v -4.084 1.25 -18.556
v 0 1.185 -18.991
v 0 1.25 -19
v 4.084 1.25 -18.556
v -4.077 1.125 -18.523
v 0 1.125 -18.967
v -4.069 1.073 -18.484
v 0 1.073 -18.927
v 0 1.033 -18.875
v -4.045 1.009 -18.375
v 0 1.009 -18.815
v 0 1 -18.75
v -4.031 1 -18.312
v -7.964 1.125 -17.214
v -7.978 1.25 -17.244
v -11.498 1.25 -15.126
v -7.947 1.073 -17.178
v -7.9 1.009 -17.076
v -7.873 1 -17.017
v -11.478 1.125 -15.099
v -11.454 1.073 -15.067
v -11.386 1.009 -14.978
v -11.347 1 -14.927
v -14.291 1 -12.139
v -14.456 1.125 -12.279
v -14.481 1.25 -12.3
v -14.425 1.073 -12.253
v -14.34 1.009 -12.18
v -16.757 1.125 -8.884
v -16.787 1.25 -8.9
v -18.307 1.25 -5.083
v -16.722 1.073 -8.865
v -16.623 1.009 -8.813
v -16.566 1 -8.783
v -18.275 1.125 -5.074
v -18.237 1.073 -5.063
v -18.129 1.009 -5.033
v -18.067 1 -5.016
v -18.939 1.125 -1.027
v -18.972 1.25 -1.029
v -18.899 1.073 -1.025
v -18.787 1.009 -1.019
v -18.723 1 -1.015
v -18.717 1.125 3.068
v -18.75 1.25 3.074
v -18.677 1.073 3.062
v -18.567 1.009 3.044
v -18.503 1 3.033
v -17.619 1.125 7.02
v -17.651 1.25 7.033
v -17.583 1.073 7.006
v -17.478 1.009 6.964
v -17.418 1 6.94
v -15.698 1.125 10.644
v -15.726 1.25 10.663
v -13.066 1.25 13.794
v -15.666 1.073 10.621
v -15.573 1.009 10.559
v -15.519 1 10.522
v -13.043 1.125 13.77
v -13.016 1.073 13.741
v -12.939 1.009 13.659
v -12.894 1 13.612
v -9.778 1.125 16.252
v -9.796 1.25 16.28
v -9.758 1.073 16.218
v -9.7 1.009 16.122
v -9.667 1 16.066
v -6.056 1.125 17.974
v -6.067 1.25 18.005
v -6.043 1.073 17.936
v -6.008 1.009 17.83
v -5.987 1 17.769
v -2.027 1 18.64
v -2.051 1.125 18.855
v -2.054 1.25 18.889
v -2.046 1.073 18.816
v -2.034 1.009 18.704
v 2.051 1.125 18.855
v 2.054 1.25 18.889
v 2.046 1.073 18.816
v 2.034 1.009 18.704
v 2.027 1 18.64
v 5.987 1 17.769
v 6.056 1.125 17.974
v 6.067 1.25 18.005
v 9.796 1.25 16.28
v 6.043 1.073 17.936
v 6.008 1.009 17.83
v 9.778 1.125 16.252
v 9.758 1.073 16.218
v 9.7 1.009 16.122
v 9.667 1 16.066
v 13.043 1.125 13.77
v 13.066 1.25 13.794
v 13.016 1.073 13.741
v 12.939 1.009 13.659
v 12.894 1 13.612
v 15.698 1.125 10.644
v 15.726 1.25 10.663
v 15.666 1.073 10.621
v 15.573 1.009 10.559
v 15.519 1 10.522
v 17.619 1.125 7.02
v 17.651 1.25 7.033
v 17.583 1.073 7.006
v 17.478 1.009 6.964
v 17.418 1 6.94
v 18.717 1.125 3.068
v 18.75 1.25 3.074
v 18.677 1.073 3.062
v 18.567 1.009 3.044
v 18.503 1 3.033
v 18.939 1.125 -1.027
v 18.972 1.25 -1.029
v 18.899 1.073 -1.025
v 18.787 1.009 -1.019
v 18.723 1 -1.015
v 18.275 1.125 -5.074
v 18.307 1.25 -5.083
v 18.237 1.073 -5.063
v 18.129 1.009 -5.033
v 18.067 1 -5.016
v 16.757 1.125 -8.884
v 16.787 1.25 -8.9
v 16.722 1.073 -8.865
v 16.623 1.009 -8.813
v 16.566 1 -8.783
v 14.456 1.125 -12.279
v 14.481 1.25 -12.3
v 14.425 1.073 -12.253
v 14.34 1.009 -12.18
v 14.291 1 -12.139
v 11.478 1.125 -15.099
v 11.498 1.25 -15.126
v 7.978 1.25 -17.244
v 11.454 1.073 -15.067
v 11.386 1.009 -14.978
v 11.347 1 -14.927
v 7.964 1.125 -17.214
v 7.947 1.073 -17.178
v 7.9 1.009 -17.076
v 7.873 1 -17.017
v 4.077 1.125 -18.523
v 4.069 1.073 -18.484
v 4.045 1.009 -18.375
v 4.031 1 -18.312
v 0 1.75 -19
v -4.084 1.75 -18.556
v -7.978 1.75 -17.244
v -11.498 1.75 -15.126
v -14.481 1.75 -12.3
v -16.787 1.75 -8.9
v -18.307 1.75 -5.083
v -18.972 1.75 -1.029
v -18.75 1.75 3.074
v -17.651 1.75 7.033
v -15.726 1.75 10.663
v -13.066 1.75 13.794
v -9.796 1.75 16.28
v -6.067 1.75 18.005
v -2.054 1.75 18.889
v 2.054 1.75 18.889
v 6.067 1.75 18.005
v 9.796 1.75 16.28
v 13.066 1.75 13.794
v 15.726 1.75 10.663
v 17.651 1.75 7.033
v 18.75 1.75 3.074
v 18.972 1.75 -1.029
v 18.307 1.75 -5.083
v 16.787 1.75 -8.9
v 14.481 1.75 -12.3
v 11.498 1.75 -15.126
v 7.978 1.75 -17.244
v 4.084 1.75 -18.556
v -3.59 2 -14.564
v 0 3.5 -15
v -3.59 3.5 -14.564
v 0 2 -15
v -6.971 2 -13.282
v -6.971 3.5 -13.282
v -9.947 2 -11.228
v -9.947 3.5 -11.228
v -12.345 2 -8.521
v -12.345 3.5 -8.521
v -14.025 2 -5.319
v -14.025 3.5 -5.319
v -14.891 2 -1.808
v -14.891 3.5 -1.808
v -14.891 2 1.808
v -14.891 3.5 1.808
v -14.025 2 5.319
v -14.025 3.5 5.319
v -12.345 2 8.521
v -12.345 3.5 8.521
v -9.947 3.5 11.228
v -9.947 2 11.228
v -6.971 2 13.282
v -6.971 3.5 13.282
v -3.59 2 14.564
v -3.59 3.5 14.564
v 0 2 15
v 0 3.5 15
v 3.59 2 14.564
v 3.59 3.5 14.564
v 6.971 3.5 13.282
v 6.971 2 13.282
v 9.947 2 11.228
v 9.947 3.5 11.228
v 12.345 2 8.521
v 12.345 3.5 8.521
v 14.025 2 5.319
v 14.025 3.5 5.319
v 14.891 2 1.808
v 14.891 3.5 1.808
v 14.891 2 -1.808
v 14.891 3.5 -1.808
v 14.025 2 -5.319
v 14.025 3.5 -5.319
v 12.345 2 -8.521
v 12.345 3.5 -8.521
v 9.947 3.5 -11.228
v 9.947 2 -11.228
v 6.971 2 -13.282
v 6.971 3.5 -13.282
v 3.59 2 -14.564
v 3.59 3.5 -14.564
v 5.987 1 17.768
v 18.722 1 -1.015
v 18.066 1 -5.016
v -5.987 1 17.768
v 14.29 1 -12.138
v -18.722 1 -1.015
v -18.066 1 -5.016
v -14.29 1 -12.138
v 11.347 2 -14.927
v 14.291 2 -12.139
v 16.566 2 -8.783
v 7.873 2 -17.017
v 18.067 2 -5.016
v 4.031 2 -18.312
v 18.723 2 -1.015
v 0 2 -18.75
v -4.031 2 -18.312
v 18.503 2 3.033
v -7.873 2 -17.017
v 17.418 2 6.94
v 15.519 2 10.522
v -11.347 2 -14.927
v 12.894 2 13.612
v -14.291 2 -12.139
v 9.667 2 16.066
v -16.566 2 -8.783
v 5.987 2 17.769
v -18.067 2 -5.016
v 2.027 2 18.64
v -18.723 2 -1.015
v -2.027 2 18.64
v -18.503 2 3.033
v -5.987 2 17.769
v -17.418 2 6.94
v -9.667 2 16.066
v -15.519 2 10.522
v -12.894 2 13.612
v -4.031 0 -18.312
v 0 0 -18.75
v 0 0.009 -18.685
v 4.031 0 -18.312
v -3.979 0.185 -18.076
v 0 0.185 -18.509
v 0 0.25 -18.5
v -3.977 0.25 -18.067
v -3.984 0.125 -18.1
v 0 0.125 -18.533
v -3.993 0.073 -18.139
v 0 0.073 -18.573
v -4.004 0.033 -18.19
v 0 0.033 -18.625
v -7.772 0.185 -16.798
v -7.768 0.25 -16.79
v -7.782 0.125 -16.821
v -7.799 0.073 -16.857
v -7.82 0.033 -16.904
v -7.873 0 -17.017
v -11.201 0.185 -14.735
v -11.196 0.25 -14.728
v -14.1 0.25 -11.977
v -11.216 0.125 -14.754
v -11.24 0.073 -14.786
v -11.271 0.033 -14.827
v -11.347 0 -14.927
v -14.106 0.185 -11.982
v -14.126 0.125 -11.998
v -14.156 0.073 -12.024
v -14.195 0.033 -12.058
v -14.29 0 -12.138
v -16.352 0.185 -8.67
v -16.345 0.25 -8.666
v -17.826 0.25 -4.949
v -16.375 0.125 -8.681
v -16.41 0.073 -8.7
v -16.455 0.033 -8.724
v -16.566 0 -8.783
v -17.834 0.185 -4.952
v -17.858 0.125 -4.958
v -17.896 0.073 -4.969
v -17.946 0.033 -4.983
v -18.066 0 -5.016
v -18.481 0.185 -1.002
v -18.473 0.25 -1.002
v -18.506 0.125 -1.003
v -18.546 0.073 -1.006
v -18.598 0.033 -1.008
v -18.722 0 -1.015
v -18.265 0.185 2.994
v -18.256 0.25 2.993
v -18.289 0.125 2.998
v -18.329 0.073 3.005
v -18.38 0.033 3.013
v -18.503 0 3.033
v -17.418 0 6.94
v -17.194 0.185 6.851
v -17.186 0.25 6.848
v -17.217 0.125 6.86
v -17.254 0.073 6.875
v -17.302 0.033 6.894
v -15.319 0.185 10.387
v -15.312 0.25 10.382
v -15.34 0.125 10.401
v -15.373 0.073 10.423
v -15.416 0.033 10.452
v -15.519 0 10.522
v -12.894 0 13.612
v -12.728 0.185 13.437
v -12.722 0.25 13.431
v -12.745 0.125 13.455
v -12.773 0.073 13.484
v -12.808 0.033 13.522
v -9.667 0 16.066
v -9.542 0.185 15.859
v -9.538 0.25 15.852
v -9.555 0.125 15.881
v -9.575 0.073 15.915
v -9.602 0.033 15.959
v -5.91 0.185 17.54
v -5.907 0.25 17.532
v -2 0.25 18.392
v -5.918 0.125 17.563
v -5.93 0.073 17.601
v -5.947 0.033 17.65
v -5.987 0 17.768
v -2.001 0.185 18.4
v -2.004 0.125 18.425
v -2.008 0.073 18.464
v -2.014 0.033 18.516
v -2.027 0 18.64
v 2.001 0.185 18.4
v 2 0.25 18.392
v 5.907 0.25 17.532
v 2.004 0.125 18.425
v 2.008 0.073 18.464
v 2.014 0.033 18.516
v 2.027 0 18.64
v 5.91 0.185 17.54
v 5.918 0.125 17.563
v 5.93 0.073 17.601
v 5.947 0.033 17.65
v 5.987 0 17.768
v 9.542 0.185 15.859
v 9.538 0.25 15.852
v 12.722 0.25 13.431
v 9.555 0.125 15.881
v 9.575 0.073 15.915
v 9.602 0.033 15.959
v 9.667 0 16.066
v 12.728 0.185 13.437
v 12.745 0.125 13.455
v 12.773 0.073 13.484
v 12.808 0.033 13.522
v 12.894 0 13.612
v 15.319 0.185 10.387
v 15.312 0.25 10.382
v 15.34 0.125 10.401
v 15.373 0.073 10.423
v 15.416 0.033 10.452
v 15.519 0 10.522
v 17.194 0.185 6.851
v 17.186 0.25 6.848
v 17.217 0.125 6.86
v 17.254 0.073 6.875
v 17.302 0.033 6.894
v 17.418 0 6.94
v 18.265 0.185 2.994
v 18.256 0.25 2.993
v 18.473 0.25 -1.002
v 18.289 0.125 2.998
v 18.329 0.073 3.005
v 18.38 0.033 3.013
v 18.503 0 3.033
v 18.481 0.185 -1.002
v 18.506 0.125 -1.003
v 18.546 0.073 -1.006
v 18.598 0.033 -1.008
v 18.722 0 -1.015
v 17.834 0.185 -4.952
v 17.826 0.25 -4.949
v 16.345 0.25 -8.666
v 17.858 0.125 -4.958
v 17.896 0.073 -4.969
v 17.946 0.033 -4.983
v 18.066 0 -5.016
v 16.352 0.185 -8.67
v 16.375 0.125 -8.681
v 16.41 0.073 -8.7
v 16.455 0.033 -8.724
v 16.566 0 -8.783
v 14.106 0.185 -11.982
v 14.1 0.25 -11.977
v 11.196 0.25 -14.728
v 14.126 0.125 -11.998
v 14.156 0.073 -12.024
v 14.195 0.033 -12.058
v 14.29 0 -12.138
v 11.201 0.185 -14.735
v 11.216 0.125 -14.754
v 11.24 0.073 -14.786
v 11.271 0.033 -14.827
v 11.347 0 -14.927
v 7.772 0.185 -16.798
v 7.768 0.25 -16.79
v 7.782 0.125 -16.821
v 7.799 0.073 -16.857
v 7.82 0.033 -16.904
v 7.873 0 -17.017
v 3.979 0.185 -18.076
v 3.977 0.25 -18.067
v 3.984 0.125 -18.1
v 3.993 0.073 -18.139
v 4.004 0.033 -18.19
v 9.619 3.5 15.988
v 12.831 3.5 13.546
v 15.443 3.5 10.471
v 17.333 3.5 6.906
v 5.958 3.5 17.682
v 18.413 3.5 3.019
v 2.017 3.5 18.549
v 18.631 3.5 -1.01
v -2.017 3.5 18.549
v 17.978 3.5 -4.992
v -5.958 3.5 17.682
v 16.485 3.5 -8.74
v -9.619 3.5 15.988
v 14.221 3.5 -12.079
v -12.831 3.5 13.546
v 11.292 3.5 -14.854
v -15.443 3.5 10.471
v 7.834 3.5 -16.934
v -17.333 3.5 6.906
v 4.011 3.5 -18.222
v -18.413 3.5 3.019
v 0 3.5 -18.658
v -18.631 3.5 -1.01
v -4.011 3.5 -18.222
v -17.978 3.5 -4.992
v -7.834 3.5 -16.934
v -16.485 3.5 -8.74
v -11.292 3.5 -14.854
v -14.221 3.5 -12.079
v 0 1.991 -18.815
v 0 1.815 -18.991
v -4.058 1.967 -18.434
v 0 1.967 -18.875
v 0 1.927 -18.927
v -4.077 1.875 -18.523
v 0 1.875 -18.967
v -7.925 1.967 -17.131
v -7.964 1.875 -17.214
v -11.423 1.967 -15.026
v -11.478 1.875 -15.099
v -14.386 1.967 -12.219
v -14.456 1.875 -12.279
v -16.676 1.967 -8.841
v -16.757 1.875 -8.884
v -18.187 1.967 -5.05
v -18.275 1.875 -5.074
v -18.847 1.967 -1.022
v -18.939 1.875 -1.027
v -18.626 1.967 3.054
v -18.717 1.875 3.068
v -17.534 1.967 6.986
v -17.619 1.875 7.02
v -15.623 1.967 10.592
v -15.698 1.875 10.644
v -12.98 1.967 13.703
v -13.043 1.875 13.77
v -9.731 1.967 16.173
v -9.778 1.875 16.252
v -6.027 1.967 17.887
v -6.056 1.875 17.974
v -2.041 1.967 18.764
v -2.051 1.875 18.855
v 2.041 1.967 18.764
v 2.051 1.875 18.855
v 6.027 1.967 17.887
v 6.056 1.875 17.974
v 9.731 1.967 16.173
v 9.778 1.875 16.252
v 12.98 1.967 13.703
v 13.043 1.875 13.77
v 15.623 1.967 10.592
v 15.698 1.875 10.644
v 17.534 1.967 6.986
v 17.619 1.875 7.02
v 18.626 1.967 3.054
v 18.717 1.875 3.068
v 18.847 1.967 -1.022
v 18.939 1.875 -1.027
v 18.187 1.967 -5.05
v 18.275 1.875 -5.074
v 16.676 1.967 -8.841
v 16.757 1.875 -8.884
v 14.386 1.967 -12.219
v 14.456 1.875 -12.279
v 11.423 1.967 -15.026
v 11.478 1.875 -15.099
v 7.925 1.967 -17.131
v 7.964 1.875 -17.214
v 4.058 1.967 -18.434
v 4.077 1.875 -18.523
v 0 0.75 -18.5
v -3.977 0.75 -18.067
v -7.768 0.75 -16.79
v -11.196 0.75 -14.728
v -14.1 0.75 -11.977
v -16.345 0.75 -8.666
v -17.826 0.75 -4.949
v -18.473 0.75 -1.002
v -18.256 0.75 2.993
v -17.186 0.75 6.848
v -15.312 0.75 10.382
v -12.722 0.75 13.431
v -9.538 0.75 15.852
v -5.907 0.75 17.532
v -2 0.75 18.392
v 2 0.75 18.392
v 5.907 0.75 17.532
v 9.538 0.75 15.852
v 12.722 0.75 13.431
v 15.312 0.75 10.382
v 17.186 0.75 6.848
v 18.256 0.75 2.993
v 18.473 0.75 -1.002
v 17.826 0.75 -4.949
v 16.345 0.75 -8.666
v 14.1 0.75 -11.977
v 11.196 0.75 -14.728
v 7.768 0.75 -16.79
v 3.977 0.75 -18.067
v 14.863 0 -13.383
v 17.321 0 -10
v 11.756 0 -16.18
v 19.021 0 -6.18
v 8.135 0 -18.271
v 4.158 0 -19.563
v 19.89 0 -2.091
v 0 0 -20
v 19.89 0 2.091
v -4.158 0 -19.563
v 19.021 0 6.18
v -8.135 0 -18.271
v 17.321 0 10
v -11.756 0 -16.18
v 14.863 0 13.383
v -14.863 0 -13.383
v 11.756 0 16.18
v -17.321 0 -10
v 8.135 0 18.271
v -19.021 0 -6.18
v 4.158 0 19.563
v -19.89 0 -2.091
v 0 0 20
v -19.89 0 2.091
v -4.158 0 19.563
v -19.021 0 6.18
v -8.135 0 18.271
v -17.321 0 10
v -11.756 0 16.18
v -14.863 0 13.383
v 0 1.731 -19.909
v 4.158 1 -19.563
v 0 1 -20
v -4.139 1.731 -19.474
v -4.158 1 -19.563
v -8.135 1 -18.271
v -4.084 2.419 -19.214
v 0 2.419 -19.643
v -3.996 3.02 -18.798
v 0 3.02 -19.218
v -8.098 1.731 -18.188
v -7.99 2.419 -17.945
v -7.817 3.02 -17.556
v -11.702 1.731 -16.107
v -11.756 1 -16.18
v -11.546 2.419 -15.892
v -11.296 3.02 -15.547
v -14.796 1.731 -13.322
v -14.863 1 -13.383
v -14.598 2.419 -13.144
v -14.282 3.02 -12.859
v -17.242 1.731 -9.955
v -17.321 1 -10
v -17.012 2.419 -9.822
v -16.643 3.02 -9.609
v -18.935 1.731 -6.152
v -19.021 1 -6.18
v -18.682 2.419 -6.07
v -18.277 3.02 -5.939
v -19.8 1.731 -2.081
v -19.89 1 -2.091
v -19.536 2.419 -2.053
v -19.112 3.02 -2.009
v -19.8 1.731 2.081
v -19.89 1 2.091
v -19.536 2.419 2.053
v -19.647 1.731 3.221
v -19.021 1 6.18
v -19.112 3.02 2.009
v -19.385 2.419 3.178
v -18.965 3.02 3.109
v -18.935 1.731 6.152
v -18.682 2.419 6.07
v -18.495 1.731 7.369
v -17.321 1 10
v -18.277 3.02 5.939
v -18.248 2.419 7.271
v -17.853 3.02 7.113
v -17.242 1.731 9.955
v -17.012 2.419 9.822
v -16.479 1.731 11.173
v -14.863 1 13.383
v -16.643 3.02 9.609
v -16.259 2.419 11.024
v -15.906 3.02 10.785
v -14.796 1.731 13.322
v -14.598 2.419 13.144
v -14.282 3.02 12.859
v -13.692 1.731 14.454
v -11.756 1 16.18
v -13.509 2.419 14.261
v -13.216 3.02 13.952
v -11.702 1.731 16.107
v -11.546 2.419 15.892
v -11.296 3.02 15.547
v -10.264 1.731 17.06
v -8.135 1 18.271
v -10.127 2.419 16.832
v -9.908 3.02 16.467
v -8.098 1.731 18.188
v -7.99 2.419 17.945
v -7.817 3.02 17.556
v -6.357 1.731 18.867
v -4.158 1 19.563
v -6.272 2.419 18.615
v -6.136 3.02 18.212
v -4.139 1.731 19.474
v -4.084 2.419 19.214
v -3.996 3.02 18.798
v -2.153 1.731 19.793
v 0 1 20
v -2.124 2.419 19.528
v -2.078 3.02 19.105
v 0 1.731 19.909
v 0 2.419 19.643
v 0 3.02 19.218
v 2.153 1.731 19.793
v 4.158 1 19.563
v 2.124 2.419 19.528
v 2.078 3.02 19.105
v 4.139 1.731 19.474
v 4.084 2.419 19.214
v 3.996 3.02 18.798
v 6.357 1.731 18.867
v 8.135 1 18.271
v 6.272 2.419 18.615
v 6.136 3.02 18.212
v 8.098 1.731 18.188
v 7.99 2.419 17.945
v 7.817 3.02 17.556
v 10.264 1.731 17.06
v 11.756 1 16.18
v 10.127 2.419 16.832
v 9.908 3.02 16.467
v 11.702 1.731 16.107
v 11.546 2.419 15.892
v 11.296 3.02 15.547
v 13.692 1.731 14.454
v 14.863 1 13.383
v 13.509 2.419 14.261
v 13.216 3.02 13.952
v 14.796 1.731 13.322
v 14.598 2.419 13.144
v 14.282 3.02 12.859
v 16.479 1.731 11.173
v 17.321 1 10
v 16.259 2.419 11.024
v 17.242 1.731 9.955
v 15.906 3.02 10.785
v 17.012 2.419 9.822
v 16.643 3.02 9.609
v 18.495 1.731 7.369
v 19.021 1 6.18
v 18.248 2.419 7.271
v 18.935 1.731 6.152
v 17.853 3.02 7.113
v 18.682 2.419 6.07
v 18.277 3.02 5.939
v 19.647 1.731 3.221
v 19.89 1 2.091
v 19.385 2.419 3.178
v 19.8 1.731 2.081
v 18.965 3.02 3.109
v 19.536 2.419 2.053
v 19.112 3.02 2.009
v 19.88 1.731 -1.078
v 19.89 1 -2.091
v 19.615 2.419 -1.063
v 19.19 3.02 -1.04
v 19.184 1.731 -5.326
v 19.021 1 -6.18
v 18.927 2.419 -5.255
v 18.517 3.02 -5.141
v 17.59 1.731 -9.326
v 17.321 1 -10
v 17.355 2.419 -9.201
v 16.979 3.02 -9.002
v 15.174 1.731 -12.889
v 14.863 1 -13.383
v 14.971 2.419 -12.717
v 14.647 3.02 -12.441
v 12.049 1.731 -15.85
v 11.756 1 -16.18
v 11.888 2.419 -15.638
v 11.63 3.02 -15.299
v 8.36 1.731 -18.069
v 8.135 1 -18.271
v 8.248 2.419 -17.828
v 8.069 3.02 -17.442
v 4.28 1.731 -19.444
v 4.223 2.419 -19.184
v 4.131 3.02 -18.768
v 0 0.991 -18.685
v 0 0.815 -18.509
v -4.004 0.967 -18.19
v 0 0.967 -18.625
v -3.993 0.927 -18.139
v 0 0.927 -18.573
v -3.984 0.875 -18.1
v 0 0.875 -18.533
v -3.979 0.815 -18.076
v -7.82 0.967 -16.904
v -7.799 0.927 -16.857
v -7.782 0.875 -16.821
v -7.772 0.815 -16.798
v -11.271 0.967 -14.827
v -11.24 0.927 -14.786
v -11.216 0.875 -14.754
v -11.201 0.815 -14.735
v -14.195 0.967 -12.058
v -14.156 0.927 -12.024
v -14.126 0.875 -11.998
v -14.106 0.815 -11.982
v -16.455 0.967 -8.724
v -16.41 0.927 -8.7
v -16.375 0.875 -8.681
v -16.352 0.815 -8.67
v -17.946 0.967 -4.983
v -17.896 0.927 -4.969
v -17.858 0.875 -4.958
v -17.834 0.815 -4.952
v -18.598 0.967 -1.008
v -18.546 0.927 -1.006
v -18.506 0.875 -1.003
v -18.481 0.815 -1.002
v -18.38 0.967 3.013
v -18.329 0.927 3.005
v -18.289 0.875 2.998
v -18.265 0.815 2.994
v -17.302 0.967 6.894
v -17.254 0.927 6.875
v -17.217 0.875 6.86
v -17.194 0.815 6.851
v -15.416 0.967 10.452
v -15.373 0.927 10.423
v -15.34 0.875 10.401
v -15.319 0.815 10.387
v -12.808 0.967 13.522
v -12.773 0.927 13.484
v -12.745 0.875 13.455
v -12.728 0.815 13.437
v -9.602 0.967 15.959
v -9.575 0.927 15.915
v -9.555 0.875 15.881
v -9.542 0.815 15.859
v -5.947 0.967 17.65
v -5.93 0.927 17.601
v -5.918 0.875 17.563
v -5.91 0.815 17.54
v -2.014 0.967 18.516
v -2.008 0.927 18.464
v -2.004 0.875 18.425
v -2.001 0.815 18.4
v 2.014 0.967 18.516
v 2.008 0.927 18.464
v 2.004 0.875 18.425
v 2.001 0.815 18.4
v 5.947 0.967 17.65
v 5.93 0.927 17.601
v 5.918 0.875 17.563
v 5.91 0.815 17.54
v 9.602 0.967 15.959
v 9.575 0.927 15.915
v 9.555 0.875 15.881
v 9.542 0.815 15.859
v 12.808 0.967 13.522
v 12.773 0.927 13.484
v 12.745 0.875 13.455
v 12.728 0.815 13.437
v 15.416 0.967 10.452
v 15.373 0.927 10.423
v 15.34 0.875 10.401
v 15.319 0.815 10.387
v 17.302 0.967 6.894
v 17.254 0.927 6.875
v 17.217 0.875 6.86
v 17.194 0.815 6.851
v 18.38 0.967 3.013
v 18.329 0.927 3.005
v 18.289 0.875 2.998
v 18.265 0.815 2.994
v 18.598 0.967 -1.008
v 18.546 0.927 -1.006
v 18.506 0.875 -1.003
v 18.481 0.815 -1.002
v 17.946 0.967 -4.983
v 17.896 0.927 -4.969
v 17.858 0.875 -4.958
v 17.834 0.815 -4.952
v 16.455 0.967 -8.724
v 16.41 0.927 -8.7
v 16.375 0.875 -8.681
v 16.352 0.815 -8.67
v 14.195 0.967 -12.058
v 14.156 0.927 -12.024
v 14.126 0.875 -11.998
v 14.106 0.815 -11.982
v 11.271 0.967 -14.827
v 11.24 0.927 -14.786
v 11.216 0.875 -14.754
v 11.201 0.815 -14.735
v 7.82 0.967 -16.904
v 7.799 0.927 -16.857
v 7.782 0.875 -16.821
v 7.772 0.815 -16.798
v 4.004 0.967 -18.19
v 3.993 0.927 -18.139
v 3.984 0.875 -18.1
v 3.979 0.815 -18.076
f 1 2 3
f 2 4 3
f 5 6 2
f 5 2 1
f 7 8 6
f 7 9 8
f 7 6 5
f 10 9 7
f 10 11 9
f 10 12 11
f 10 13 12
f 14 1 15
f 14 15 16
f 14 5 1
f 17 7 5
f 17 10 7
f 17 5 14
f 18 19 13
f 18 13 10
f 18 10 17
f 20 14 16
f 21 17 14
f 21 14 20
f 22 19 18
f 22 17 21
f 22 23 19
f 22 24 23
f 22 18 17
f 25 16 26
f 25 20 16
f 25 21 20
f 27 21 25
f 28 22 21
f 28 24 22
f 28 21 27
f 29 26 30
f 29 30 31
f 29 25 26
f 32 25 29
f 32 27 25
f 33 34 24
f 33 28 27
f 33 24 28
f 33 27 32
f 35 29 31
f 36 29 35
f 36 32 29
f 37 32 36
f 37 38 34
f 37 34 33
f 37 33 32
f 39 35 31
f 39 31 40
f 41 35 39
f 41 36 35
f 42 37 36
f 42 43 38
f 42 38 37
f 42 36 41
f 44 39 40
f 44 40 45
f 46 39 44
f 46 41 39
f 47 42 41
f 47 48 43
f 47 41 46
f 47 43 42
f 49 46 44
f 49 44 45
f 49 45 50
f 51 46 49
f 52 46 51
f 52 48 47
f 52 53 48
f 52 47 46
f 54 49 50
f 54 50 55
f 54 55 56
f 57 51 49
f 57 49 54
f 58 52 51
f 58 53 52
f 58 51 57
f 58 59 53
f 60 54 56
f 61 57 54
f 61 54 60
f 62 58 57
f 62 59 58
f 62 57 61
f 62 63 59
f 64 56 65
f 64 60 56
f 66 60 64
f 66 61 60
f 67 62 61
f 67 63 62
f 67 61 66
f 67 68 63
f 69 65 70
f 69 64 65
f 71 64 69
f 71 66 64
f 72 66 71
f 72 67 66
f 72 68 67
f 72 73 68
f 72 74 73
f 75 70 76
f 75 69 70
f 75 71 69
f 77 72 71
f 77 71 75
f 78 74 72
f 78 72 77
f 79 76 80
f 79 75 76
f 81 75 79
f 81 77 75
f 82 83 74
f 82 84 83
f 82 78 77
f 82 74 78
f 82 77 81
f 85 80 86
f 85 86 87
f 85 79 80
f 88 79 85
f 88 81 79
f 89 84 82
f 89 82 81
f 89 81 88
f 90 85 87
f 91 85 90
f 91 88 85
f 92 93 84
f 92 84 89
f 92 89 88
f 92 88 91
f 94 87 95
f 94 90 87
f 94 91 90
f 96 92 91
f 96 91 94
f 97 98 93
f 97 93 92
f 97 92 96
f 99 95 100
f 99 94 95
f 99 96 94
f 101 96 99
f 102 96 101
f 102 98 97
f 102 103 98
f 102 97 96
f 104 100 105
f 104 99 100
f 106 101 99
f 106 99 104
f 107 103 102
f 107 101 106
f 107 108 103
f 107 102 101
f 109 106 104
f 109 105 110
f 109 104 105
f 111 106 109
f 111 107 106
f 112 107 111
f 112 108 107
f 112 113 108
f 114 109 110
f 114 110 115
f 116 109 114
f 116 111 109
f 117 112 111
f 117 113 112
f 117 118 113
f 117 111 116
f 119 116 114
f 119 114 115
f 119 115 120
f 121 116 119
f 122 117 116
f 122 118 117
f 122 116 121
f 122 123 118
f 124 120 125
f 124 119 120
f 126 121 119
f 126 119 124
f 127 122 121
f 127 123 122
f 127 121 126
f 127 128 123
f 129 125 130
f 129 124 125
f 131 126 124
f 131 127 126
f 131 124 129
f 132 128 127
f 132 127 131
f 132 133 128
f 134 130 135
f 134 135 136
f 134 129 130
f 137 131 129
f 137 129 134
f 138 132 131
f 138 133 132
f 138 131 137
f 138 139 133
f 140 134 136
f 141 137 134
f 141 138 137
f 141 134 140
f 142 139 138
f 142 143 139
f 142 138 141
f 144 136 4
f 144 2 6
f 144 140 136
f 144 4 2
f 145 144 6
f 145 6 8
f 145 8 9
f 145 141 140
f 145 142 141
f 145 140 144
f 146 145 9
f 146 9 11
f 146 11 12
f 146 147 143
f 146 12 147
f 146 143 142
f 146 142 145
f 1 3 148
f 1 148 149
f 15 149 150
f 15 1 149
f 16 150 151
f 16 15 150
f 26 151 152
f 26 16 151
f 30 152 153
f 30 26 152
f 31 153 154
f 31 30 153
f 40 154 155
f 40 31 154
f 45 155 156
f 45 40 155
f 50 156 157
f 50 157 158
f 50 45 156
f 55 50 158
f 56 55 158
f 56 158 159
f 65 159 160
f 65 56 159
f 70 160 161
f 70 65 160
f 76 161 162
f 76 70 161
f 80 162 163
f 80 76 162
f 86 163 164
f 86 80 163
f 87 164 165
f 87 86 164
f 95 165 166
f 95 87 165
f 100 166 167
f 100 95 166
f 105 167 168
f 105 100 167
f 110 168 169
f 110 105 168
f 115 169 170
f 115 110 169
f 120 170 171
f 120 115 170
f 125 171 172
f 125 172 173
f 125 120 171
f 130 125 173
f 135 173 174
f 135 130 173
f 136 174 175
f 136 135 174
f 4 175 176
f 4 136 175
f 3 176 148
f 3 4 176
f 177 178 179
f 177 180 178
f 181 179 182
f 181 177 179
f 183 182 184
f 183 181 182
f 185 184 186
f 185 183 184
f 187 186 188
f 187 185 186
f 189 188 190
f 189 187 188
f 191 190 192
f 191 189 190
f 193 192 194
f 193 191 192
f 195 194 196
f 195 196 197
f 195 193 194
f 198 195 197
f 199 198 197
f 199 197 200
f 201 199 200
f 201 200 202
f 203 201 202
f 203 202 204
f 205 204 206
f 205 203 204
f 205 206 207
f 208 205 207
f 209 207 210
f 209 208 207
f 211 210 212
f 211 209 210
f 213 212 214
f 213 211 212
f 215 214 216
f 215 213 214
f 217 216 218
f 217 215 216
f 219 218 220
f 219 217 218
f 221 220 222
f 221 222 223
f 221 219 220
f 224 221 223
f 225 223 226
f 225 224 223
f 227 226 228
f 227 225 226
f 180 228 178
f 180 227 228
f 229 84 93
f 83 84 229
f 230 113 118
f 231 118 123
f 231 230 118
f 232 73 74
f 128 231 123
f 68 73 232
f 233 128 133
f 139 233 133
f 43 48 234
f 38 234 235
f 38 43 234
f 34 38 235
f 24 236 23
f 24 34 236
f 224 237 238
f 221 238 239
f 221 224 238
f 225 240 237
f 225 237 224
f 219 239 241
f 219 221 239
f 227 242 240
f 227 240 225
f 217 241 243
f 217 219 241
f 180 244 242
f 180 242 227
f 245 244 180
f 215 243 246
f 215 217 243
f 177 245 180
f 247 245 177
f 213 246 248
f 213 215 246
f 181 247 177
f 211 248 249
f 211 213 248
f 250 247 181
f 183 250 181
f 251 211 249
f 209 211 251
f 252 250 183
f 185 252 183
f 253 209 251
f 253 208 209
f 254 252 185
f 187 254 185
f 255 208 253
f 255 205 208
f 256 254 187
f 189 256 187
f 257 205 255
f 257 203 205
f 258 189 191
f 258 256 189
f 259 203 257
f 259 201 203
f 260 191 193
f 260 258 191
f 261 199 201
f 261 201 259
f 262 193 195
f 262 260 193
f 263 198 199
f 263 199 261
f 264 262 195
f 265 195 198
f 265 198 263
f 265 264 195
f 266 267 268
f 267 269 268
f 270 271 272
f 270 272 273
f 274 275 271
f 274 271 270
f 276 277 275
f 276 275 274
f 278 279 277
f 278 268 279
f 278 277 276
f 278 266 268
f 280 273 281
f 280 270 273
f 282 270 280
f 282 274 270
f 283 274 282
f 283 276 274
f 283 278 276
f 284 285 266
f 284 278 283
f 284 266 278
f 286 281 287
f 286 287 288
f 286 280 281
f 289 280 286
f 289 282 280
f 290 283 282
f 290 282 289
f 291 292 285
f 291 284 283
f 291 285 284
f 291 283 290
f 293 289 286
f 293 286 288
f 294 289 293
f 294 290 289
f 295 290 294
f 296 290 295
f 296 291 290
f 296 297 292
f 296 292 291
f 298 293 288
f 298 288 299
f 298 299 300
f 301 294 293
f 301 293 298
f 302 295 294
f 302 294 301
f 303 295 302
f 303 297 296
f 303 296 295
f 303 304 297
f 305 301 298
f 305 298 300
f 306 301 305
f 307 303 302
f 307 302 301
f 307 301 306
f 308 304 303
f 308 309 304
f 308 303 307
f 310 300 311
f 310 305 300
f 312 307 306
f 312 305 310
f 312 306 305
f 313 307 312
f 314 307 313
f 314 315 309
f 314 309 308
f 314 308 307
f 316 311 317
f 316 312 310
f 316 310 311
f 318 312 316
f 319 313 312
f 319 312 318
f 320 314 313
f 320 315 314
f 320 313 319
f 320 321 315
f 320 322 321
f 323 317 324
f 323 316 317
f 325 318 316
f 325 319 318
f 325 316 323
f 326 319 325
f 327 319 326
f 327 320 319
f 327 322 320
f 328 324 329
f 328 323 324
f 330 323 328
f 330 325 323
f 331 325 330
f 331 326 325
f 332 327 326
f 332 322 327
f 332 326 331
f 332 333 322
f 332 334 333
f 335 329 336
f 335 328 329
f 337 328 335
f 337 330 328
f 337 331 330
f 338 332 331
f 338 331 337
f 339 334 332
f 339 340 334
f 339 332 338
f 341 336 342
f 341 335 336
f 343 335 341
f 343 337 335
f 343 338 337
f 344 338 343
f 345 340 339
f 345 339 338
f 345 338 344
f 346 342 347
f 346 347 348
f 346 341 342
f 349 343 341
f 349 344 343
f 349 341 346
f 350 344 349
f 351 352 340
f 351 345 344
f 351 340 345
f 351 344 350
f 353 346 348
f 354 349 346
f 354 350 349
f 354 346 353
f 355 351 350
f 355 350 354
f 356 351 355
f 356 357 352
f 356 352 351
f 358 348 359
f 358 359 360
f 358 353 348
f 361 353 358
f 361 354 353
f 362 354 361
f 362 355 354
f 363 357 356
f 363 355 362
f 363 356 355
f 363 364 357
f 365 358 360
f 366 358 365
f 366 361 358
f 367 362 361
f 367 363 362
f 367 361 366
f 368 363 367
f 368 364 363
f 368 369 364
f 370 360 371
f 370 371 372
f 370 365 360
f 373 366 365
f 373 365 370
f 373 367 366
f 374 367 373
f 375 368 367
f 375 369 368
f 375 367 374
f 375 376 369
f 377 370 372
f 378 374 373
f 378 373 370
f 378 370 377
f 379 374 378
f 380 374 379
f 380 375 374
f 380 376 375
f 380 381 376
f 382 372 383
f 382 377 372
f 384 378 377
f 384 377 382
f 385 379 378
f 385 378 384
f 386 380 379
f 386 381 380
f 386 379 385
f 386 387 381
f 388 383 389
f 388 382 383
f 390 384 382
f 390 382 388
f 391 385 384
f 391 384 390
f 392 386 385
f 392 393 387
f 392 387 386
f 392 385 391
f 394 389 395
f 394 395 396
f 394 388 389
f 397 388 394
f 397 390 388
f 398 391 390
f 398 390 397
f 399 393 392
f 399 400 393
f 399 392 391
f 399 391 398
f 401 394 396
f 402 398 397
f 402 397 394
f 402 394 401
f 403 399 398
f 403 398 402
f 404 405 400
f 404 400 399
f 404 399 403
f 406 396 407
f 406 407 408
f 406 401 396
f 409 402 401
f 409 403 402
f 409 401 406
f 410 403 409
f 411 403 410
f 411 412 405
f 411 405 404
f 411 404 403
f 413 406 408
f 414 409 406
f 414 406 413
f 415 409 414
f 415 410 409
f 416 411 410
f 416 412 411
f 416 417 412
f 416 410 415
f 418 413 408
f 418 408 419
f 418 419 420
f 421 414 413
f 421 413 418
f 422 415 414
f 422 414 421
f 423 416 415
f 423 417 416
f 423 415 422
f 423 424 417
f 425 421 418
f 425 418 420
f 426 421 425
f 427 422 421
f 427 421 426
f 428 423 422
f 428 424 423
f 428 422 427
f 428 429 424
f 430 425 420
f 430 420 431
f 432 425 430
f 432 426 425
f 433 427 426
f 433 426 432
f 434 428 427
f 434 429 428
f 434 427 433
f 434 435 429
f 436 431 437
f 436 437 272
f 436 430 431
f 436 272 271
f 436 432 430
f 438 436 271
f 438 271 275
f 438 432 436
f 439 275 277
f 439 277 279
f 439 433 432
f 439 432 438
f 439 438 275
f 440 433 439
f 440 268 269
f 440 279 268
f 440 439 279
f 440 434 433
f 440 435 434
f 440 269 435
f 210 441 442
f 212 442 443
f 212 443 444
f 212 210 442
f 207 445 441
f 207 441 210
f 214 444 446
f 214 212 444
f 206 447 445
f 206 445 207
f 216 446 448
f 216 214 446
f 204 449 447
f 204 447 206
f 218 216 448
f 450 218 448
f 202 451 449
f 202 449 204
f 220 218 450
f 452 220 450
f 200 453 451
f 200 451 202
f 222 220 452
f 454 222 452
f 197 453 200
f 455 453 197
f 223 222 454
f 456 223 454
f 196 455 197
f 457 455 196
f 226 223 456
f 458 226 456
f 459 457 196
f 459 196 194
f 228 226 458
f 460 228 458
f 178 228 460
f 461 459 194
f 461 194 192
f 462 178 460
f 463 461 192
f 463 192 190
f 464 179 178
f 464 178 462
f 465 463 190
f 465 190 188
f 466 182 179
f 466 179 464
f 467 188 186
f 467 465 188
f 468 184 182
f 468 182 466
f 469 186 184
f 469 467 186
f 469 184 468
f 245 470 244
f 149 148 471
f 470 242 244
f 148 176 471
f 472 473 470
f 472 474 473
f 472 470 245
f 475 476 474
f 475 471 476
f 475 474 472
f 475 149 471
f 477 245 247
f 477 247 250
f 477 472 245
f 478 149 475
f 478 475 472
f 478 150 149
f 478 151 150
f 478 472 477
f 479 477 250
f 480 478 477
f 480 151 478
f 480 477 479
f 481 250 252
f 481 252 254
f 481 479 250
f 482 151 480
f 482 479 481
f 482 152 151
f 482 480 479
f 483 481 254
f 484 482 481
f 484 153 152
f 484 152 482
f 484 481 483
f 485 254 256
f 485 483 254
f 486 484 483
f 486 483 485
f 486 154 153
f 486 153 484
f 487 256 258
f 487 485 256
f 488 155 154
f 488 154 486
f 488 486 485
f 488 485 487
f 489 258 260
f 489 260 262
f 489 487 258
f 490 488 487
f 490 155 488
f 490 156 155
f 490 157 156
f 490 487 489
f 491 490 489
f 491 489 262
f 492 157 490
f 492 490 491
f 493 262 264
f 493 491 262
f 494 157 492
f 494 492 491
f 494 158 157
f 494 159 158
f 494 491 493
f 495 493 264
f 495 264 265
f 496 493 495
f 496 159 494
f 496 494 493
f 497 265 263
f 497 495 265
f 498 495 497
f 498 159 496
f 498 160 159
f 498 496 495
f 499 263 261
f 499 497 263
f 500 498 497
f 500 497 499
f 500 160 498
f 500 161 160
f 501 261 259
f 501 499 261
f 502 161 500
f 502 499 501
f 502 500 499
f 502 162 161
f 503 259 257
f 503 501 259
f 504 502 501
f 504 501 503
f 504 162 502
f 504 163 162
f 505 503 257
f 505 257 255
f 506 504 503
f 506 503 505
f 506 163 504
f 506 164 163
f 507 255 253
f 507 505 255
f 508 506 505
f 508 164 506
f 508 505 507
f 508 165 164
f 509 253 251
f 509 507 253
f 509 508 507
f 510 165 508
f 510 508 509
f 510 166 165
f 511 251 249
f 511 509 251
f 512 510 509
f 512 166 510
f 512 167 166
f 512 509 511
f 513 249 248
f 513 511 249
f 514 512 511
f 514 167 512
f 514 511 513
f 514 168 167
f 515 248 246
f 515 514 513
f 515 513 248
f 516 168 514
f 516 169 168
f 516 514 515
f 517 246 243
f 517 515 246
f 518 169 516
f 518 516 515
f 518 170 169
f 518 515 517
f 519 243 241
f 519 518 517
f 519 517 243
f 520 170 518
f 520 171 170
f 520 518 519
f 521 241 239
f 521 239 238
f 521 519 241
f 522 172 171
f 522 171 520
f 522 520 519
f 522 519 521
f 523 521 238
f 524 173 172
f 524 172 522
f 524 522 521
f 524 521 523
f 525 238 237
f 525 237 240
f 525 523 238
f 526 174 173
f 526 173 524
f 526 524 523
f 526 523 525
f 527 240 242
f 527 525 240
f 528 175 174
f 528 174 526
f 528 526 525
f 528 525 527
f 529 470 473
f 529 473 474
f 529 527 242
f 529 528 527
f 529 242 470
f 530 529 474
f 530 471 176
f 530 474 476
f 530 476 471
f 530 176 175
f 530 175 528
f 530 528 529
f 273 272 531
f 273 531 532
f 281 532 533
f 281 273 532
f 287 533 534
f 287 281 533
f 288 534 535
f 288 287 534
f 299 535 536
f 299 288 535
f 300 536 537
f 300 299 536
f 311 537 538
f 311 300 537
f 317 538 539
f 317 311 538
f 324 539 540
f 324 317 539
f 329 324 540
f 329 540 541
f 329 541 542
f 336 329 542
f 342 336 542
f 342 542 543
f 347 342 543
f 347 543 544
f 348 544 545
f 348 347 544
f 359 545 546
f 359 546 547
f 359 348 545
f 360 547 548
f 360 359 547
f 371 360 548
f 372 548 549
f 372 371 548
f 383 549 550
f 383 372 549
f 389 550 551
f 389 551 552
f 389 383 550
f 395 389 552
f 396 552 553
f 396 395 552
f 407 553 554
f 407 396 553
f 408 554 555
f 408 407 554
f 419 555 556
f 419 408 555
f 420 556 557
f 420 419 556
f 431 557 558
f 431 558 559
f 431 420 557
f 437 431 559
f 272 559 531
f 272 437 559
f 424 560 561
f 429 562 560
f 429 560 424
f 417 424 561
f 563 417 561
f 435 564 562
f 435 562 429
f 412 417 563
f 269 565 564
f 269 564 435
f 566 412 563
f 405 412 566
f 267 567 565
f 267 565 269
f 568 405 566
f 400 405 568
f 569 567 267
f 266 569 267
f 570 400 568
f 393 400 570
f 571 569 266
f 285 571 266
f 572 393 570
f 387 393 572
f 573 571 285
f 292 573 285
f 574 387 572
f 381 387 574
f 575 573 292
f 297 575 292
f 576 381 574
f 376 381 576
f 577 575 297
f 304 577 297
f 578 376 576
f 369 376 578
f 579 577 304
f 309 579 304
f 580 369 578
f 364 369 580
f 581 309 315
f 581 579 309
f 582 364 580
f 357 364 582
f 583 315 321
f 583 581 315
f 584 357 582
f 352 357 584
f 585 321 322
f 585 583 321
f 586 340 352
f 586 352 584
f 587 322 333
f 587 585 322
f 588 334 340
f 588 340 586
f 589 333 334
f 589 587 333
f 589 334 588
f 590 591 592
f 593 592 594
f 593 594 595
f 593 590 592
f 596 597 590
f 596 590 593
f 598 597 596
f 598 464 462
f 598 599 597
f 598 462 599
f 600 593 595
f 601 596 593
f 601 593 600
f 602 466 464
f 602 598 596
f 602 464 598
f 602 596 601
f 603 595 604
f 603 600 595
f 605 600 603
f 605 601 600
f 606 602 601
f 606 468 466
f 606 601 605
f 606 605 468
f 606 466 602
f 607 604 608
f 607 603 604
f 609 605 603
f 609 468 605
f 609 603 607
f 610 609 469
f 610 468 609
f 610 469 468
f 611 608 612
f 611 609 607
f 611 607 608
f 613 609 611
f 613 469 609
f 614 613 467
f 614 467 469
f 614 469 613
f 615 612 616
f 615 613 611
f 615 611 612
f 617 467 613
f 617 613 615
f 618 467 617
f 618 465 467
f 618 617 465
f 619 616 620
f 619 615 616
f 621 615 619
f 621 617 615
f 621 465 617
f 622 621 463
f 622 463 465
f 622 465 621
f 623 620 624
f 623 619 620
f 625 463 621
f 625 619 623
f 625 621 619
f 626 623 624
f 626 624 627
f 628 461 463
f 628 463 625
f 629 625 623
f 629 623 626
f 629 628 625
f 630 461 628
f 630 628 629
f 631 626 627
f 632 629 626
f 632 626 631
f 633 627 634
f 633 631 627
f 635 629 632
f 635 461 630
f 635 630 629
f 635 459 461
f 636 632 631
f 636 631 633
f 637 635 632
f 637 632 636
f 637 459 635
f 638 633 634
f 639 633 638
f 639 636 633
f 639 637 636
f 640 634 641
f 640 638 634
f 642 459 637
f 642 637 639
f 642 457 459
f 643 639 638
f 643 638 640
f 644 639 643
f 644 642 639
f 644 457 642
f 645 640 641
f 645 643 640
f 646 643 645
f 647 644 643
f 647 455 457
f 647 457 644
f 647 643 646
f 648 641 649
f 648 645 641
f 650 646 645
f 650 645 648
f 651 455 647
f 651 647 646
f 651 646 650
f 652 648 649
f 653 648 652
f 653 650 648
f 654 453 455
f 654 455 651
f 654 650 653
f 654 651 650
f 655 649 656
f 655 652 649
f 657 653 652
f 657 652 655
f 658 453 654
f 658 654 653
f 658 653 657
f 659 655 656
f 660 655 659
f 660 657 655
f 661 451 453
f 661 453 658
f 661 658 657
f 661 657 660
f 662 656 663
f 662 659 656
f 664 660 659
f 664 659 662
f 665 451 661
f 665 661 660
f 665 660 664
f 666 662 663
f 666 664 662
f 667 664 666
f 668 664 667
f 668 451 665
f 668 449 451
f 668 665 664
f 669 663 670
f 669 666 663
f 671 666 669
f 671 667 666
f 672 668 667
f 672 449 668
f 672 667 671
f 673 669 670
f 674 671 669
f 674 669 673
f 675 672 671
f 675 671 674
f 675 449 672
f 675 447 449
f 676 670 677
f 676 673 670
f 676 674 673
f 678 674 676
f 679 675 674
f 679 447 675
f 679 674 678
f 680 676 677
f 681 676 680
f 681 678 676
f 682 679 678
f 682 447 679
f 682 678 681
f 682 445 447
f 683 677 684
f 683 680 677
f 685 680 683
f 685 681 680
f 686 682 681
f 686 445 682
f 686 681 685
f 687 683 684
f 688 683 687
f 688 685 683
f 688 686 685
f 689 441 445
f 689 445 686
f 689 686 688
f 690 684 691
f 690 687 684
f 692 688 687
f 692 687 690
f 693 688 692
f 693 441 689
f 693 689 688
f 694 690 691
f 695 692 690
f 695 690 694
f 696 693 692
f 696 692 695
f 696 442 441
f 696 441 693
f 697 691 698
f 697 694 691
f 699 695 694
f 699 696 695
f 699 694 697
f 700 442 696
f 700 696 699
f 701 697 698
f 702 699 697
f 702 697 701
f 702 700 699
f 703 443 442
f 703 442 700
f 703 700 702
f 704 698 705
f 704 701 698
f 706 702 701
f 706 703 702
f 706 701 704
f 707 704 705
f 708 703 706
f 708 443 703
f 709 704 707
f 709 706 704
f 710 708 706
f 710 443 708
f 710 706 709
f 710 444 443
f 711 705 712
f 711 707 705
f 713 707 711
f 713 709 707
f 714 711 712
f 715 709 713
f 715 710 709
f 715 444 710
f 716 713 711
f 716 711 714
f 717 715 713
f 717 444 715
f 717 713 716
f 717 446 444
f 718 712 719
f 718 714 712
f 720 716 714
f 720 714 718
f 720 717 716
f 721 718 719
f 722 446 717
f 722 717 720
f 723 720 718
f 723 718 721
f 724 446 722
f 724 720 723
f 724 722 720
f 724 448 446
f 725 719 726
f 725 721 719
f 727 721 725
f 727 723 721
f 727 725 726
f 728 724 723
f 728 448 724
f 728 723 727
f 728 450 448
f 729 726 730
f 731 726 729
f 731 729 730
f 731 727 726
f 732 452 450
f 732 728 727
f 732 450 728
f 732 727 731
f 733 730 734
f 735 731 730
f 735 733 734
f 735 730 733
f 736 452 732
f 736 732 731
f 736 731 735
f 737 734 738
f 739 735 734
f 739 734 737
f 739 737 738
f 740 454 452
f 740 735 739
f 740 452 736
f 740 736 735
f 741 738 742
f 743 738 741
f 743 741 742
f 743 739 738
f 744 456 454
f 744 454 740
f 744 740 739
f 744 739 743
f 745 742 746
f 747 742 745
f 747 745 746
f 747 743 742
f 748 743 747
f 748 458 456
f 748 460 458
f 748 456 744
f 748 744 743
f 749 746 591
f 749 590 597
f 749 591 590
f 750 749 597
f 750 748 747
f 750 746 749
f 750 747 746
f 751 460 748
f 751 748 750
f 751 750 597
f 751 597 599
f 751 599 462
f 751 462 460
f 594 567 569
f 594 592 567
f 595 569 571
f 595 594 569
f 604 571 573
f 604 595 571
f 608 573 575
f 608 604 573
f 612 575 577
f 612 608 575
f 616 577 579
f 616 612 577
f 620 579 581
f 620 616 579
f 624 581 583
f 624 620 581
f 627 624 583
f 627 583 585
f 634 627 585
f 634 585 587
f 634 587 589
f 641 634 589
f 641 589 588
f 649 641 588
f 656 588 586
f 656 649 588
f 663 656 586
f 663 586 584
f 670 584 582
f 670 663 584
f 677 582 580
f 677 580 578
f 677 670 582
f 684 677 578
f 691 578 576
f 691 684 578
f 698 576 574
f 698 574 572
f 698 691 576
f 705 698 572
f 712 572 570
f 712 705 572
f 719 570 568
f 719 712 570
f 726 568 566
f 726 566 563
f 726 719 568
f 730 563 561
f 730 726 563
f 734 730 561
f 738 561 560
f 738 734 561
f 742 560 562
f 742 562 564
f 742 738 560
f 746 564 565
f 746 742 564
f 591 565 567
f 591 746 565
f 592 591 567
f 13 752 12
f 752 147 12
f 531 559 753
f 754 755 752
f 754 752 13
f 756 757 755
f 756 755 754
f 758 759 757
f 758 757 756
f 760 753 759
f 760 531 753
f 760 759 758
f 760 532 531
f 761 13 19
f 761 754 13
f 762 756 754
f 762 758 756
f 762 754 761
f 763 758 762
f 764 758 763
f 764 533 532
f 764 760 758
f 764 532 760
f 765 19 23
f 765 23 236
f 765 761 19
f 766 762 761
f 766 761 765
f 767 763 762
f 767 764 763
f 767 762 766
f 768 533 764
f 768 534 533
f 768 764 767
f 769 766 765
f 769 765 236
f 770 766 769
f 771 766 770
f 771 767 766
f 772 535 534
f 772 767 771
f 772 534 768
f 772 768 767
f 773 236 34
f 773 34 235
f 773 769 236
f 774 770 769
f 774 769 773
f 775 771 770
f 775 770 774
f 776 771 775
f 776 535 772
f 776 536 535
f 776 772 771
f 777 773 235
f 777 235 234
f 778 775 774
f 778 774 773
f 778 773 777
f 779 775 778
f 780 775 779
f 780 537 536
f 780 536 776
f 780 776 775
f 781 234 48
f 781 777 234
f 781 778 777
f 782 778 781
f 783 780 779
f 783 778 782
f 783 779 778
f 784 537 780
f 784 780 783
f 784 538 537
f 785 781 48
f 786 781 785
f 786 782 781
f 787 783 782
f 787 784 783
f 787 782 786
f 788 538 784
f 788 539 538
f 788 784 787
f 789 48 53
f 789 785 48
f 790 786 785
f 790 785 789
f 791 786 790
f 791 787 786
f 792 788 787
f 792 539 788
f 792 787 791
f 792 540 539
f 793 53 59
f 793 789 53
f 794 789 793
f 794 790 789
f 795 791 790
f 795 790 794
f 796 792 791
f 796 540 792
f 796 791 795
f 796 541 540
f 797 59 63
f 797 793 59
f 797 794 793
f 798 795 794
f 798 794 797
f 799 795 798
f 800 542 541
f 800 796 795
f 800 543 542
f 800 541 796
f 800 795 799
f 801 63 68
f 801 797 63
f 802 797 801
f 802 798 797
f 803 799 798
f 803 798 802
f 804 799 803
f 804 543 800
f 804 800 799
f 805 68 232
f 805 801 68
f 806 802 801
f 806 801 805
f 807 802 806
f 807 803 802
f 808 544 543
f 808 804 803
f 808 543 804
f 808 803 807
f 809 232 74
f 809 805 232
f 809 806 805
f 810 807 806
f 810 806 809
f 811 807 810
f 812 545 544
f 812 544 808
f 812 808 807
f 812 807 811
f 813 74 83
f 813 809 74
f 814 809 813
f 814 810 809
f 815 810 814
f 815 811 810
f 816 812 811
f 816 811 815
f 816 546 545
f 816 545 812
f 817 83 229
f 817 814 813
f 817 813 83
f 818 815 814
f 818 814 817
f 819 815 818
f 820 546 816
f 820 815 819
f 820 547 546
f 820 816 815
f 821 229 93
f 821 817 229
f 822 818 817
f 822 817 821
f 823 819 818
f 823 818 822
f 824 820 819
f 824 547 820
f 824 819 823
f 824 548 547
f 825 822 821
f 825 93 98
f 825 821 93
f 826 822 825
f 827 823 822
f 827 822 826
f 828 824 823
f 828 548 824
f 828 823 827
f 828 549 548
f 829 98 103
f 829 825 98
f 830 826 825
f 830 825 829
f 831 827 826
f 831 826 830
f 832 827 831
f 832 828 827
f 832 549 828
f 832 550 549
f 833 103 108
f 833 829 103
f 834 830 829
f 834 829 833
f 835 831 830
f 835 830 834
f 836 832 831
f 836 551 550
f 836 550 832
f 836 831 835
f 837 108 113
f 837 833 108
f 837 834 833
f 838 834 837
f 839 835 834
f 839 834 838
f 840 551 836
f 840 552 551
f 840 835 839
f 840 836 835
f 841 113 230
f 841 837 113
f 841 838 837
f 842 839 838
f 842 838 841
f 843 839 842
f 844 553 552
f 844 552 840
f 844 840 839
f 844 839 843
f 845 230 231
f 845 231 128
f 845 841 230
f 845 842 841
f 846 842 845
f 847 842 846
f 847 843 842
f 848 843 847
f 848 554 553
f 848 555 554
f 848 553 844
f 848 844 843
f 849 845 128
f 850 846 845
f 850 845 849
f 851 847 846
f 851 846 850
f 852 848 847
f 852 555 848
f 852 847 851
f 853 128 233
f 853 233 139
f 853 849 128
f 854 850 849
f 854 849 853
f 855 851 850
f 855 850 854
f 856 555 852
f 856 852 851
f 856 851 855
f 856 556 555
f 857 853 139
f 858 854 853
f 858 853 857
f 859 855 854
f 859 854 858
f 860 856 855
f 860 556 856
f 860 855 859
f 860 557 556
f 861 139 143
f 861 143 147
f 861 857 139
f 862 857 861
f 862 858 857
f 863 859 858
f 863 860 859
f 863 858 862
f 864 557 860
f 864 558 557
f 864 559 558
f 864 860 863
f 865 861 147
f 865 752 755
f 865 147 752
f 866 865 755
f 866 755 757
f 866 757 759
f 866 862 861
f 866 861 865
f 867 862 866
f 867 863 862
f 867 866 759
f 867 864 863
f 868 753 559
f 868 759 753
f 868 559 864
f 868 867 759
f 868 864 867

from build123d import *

# Parameters (mm, degrees)
REDONDEO1_R = 0.25


with BuildPart() as part:
    # Croquis1 → Revolución1 (revolve)
    with BuildSketch(Plane.XY, mode=Mode.PRIVATE) as revoluci_n1_sk:
        with BuildLine():
            Line((20, 0), (20, 1))
            ThreePointArc((20, 1), (19.643382037, 2.418637165), (18.658312395, 3.5))
            Line((18.658312395, 3.5), (15, 3.5))
            Line((15, 3.5), (15, 2))
            Line((15, 2), (19, 2))
            Line((19, 2), (19, 1))
            Line((19, 1), (18.5, 1))
            Line((18.5, 1), (18.5, 0))
            Line((18.5, 0), (20, 0))
        make_face()
    revolve(revoluci_n1_sk.sketch.rotate(Axis((0, 0, 0), (0, 1, 0)), 90), axis=Axis((0, 0, 0), (0, 1, 0)))

    # Redondeo1
    redondeo1_edges = [part.edges().sort_by_distance(p)[0] for p in [
        (0, 0, 18.5),
        (0, 1, 18.5),
        (0, 1, 19),
        (0, 2, 19),
    ]]
    fillet(redondeo1_edges, radius=REDONDEO1_R - 0.0001)  # a hair under: the kernel refuses the full size


solid = part.part
